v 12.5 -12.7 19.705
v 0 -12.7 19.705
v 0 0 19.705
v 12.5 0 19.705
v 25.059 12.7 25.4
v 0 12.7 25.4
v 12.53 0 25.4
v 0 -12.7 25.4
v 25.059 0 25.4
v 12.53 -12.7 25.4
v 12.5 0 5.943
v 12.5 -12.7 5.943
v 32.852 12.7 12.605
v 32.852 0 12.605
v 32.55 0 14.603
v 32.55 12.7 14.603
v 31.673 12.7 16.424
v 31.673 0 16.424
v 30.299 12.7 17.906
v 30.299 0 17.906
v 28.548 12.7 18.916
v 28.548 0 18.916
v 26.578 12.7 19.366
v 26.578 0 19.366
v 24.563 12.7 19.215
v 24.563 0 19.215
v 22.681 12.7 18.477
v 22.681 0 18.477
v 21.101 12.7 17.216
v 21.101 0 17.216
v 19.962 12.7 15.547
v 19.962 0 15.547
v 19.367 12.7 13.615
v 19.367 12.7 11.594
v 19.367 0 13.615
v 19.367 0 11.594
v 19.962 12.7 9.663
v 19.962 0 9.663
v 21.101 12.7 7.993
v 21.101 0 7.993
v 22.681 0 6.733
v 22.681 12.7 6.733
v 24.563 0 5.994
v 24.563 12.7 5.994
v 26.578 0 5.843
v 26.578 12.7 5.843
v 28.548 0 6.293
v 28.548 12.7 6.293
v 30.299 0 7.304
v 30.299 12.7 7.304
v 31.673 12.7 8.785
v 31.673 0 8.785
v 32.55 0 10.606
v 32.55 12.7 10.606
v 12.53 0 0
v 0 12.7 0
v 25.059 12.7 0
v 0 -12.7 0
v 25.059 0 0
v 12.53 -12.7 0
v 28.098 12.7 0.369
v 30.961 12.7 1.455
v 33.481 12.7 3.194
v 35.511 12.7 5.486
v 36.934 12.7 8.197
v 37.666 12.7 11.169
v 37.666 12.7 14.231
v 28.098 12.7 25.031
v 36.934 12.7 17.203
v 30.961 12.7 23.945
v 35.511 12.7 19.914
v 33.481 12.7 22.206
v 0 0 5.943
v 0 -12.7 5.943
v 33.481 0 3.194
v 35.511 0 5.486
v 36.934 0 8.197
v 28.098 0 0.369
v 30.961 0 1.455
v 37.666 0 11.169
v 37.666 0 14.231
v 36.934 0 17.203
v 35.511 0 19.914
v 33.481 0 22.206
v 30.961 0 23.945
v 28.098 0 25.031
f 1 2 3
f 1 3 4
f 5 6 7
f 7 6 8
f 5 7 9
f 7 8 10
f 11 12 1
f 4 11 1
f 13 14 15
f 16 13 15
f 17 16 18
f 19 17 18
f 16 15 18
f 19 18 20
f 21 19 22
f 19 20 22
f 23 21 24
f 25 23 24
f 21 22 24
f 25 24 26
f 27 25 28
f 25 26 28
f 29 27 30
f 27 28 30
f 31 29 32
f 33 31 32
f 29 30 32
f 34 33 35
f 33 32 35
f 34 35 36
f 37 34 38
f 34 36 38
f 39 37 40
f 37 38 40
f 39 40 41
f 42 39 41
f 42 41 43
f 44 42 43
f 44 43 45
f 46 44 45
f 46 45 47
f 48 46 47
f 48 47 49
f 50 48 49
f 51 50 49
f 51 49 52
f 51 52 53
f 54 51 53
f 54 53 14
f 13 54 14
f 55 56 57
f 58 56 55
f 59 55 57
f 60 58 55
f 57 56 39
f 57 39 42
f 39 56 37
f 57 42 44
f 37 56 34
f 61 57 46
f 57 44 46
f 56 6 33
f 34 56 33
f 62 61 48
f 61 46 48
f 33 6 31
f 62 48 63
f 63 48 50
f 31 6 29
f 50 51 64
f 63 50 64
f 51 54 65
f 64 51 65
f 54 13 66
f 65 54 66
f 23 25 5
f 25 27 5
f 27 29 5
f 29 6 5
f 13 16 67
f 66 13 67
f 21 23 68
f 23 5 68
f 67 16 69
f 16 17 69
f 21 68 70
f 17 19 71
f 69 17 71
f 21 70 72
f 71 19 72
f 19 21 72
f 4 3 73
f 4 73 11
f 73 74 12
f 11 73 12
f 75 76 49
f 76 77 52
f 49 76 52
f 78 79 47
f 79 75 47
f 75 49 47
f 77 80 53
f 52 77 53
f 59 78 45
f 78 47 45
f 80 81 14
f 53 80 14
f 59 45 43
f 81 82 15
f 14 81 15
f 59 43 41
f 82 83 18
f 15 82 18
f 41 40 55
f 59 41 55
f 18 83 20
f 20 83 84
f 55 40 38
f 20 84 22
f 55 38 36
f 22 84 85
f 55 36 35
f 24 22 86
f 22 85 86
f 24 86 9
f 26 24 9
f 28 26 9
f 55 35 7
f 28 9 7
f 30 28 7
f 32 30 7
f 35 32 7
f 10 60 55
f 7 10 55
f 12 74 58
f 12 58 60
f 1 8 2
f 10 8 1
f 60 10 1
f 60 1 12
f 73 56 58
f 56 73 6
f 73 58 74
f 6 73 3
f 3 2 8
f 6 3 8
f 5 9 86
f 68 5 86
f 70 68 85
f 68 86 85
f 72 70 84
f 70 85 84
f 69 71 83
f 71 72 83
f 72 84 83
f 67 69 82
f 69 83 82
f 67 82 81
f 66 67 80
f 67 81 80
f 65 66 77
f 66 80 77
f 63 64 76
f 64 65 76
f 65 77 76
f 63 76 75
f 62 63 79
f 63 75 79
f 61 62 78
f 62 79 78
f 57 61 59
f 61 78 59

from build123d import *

# Parameters (mm, degrees)
F0_W     = 38.1
F0_H     = 25.4
F1_DEPTH = 12.7
F3_DEPTH = 25.401
F4_W     = 12.529509142
F4_H     = 12.7
F4_W_2   = 13.1820067763
F5_DEPTH = 25.401
F6_W     = 12.4995596707
F6_H     = 13.7623953633
F7_DEPTH = 12.7
F8_R     = 6.780247306
F9_DEPTH = 12.701


with BuildPart() as f1:
    # F0 (on Front) → F1 (new body, symmetric)
    with BuildSketch(Plane.XZ):
        with Locations((19.05, 12.7)):
            Rectangle(F0_W, F0_H)
    extrude(amount=F1_DEPTH, both=True)

    # F2 (on face) → F3 (cut, through all)
    with BuildSketch(Plane.XZ.offset(12.7)):
        with BuildLine():
            Line((38.1, 25.4), (25.0590182841, 25.4))
            ThreePointArc((25.0590182841, 25.4), (37.7590182841, 12.7), (25.0590182841, 0))
            Line((25.0590182841, 0), (38.1, 0))
            Line((38.1, 0), (38.1, 25.4))
        make_face()
    extrude(amount=-F3_DEPTH, mode=Mode.SUBTRACT)

    # F4 (on face) → F5 (cut, through all)
    with BuildSketch(Plane.XY.offset(25.4)):
        with Locations((18.7942637131, -6.35)):
            Rectangle(F4_W, F4_H)
        with Locations((31.6500216722, -6.35)):
            Rectangle(F4_W_2, F4_H)
    extrude(amount=-F5_DEPTH, mode=Mode.SUBTRACT)

    # F6 (on face) → F7 (cut)
    with BuildSketch(Plane.XZ.offset(12.7)):
        with Locations((6.2497798353, 12.8240382764)):
            Rectangle(F6_W, F6_H)
    extrude(amount=-F7_DEPTH, mode=Mode.SUBTRACT)

    # F8 (on face) → F9 (cut, through all)
    with BuildSketch(Plane.XZ):
        with Locations((26.0712560266, 12.6046799123)):
            Circle(F8_R)
    extrude(amount=-F9_DEPTH, mode=Mode.SUBTRACT)


solid = f1.part
